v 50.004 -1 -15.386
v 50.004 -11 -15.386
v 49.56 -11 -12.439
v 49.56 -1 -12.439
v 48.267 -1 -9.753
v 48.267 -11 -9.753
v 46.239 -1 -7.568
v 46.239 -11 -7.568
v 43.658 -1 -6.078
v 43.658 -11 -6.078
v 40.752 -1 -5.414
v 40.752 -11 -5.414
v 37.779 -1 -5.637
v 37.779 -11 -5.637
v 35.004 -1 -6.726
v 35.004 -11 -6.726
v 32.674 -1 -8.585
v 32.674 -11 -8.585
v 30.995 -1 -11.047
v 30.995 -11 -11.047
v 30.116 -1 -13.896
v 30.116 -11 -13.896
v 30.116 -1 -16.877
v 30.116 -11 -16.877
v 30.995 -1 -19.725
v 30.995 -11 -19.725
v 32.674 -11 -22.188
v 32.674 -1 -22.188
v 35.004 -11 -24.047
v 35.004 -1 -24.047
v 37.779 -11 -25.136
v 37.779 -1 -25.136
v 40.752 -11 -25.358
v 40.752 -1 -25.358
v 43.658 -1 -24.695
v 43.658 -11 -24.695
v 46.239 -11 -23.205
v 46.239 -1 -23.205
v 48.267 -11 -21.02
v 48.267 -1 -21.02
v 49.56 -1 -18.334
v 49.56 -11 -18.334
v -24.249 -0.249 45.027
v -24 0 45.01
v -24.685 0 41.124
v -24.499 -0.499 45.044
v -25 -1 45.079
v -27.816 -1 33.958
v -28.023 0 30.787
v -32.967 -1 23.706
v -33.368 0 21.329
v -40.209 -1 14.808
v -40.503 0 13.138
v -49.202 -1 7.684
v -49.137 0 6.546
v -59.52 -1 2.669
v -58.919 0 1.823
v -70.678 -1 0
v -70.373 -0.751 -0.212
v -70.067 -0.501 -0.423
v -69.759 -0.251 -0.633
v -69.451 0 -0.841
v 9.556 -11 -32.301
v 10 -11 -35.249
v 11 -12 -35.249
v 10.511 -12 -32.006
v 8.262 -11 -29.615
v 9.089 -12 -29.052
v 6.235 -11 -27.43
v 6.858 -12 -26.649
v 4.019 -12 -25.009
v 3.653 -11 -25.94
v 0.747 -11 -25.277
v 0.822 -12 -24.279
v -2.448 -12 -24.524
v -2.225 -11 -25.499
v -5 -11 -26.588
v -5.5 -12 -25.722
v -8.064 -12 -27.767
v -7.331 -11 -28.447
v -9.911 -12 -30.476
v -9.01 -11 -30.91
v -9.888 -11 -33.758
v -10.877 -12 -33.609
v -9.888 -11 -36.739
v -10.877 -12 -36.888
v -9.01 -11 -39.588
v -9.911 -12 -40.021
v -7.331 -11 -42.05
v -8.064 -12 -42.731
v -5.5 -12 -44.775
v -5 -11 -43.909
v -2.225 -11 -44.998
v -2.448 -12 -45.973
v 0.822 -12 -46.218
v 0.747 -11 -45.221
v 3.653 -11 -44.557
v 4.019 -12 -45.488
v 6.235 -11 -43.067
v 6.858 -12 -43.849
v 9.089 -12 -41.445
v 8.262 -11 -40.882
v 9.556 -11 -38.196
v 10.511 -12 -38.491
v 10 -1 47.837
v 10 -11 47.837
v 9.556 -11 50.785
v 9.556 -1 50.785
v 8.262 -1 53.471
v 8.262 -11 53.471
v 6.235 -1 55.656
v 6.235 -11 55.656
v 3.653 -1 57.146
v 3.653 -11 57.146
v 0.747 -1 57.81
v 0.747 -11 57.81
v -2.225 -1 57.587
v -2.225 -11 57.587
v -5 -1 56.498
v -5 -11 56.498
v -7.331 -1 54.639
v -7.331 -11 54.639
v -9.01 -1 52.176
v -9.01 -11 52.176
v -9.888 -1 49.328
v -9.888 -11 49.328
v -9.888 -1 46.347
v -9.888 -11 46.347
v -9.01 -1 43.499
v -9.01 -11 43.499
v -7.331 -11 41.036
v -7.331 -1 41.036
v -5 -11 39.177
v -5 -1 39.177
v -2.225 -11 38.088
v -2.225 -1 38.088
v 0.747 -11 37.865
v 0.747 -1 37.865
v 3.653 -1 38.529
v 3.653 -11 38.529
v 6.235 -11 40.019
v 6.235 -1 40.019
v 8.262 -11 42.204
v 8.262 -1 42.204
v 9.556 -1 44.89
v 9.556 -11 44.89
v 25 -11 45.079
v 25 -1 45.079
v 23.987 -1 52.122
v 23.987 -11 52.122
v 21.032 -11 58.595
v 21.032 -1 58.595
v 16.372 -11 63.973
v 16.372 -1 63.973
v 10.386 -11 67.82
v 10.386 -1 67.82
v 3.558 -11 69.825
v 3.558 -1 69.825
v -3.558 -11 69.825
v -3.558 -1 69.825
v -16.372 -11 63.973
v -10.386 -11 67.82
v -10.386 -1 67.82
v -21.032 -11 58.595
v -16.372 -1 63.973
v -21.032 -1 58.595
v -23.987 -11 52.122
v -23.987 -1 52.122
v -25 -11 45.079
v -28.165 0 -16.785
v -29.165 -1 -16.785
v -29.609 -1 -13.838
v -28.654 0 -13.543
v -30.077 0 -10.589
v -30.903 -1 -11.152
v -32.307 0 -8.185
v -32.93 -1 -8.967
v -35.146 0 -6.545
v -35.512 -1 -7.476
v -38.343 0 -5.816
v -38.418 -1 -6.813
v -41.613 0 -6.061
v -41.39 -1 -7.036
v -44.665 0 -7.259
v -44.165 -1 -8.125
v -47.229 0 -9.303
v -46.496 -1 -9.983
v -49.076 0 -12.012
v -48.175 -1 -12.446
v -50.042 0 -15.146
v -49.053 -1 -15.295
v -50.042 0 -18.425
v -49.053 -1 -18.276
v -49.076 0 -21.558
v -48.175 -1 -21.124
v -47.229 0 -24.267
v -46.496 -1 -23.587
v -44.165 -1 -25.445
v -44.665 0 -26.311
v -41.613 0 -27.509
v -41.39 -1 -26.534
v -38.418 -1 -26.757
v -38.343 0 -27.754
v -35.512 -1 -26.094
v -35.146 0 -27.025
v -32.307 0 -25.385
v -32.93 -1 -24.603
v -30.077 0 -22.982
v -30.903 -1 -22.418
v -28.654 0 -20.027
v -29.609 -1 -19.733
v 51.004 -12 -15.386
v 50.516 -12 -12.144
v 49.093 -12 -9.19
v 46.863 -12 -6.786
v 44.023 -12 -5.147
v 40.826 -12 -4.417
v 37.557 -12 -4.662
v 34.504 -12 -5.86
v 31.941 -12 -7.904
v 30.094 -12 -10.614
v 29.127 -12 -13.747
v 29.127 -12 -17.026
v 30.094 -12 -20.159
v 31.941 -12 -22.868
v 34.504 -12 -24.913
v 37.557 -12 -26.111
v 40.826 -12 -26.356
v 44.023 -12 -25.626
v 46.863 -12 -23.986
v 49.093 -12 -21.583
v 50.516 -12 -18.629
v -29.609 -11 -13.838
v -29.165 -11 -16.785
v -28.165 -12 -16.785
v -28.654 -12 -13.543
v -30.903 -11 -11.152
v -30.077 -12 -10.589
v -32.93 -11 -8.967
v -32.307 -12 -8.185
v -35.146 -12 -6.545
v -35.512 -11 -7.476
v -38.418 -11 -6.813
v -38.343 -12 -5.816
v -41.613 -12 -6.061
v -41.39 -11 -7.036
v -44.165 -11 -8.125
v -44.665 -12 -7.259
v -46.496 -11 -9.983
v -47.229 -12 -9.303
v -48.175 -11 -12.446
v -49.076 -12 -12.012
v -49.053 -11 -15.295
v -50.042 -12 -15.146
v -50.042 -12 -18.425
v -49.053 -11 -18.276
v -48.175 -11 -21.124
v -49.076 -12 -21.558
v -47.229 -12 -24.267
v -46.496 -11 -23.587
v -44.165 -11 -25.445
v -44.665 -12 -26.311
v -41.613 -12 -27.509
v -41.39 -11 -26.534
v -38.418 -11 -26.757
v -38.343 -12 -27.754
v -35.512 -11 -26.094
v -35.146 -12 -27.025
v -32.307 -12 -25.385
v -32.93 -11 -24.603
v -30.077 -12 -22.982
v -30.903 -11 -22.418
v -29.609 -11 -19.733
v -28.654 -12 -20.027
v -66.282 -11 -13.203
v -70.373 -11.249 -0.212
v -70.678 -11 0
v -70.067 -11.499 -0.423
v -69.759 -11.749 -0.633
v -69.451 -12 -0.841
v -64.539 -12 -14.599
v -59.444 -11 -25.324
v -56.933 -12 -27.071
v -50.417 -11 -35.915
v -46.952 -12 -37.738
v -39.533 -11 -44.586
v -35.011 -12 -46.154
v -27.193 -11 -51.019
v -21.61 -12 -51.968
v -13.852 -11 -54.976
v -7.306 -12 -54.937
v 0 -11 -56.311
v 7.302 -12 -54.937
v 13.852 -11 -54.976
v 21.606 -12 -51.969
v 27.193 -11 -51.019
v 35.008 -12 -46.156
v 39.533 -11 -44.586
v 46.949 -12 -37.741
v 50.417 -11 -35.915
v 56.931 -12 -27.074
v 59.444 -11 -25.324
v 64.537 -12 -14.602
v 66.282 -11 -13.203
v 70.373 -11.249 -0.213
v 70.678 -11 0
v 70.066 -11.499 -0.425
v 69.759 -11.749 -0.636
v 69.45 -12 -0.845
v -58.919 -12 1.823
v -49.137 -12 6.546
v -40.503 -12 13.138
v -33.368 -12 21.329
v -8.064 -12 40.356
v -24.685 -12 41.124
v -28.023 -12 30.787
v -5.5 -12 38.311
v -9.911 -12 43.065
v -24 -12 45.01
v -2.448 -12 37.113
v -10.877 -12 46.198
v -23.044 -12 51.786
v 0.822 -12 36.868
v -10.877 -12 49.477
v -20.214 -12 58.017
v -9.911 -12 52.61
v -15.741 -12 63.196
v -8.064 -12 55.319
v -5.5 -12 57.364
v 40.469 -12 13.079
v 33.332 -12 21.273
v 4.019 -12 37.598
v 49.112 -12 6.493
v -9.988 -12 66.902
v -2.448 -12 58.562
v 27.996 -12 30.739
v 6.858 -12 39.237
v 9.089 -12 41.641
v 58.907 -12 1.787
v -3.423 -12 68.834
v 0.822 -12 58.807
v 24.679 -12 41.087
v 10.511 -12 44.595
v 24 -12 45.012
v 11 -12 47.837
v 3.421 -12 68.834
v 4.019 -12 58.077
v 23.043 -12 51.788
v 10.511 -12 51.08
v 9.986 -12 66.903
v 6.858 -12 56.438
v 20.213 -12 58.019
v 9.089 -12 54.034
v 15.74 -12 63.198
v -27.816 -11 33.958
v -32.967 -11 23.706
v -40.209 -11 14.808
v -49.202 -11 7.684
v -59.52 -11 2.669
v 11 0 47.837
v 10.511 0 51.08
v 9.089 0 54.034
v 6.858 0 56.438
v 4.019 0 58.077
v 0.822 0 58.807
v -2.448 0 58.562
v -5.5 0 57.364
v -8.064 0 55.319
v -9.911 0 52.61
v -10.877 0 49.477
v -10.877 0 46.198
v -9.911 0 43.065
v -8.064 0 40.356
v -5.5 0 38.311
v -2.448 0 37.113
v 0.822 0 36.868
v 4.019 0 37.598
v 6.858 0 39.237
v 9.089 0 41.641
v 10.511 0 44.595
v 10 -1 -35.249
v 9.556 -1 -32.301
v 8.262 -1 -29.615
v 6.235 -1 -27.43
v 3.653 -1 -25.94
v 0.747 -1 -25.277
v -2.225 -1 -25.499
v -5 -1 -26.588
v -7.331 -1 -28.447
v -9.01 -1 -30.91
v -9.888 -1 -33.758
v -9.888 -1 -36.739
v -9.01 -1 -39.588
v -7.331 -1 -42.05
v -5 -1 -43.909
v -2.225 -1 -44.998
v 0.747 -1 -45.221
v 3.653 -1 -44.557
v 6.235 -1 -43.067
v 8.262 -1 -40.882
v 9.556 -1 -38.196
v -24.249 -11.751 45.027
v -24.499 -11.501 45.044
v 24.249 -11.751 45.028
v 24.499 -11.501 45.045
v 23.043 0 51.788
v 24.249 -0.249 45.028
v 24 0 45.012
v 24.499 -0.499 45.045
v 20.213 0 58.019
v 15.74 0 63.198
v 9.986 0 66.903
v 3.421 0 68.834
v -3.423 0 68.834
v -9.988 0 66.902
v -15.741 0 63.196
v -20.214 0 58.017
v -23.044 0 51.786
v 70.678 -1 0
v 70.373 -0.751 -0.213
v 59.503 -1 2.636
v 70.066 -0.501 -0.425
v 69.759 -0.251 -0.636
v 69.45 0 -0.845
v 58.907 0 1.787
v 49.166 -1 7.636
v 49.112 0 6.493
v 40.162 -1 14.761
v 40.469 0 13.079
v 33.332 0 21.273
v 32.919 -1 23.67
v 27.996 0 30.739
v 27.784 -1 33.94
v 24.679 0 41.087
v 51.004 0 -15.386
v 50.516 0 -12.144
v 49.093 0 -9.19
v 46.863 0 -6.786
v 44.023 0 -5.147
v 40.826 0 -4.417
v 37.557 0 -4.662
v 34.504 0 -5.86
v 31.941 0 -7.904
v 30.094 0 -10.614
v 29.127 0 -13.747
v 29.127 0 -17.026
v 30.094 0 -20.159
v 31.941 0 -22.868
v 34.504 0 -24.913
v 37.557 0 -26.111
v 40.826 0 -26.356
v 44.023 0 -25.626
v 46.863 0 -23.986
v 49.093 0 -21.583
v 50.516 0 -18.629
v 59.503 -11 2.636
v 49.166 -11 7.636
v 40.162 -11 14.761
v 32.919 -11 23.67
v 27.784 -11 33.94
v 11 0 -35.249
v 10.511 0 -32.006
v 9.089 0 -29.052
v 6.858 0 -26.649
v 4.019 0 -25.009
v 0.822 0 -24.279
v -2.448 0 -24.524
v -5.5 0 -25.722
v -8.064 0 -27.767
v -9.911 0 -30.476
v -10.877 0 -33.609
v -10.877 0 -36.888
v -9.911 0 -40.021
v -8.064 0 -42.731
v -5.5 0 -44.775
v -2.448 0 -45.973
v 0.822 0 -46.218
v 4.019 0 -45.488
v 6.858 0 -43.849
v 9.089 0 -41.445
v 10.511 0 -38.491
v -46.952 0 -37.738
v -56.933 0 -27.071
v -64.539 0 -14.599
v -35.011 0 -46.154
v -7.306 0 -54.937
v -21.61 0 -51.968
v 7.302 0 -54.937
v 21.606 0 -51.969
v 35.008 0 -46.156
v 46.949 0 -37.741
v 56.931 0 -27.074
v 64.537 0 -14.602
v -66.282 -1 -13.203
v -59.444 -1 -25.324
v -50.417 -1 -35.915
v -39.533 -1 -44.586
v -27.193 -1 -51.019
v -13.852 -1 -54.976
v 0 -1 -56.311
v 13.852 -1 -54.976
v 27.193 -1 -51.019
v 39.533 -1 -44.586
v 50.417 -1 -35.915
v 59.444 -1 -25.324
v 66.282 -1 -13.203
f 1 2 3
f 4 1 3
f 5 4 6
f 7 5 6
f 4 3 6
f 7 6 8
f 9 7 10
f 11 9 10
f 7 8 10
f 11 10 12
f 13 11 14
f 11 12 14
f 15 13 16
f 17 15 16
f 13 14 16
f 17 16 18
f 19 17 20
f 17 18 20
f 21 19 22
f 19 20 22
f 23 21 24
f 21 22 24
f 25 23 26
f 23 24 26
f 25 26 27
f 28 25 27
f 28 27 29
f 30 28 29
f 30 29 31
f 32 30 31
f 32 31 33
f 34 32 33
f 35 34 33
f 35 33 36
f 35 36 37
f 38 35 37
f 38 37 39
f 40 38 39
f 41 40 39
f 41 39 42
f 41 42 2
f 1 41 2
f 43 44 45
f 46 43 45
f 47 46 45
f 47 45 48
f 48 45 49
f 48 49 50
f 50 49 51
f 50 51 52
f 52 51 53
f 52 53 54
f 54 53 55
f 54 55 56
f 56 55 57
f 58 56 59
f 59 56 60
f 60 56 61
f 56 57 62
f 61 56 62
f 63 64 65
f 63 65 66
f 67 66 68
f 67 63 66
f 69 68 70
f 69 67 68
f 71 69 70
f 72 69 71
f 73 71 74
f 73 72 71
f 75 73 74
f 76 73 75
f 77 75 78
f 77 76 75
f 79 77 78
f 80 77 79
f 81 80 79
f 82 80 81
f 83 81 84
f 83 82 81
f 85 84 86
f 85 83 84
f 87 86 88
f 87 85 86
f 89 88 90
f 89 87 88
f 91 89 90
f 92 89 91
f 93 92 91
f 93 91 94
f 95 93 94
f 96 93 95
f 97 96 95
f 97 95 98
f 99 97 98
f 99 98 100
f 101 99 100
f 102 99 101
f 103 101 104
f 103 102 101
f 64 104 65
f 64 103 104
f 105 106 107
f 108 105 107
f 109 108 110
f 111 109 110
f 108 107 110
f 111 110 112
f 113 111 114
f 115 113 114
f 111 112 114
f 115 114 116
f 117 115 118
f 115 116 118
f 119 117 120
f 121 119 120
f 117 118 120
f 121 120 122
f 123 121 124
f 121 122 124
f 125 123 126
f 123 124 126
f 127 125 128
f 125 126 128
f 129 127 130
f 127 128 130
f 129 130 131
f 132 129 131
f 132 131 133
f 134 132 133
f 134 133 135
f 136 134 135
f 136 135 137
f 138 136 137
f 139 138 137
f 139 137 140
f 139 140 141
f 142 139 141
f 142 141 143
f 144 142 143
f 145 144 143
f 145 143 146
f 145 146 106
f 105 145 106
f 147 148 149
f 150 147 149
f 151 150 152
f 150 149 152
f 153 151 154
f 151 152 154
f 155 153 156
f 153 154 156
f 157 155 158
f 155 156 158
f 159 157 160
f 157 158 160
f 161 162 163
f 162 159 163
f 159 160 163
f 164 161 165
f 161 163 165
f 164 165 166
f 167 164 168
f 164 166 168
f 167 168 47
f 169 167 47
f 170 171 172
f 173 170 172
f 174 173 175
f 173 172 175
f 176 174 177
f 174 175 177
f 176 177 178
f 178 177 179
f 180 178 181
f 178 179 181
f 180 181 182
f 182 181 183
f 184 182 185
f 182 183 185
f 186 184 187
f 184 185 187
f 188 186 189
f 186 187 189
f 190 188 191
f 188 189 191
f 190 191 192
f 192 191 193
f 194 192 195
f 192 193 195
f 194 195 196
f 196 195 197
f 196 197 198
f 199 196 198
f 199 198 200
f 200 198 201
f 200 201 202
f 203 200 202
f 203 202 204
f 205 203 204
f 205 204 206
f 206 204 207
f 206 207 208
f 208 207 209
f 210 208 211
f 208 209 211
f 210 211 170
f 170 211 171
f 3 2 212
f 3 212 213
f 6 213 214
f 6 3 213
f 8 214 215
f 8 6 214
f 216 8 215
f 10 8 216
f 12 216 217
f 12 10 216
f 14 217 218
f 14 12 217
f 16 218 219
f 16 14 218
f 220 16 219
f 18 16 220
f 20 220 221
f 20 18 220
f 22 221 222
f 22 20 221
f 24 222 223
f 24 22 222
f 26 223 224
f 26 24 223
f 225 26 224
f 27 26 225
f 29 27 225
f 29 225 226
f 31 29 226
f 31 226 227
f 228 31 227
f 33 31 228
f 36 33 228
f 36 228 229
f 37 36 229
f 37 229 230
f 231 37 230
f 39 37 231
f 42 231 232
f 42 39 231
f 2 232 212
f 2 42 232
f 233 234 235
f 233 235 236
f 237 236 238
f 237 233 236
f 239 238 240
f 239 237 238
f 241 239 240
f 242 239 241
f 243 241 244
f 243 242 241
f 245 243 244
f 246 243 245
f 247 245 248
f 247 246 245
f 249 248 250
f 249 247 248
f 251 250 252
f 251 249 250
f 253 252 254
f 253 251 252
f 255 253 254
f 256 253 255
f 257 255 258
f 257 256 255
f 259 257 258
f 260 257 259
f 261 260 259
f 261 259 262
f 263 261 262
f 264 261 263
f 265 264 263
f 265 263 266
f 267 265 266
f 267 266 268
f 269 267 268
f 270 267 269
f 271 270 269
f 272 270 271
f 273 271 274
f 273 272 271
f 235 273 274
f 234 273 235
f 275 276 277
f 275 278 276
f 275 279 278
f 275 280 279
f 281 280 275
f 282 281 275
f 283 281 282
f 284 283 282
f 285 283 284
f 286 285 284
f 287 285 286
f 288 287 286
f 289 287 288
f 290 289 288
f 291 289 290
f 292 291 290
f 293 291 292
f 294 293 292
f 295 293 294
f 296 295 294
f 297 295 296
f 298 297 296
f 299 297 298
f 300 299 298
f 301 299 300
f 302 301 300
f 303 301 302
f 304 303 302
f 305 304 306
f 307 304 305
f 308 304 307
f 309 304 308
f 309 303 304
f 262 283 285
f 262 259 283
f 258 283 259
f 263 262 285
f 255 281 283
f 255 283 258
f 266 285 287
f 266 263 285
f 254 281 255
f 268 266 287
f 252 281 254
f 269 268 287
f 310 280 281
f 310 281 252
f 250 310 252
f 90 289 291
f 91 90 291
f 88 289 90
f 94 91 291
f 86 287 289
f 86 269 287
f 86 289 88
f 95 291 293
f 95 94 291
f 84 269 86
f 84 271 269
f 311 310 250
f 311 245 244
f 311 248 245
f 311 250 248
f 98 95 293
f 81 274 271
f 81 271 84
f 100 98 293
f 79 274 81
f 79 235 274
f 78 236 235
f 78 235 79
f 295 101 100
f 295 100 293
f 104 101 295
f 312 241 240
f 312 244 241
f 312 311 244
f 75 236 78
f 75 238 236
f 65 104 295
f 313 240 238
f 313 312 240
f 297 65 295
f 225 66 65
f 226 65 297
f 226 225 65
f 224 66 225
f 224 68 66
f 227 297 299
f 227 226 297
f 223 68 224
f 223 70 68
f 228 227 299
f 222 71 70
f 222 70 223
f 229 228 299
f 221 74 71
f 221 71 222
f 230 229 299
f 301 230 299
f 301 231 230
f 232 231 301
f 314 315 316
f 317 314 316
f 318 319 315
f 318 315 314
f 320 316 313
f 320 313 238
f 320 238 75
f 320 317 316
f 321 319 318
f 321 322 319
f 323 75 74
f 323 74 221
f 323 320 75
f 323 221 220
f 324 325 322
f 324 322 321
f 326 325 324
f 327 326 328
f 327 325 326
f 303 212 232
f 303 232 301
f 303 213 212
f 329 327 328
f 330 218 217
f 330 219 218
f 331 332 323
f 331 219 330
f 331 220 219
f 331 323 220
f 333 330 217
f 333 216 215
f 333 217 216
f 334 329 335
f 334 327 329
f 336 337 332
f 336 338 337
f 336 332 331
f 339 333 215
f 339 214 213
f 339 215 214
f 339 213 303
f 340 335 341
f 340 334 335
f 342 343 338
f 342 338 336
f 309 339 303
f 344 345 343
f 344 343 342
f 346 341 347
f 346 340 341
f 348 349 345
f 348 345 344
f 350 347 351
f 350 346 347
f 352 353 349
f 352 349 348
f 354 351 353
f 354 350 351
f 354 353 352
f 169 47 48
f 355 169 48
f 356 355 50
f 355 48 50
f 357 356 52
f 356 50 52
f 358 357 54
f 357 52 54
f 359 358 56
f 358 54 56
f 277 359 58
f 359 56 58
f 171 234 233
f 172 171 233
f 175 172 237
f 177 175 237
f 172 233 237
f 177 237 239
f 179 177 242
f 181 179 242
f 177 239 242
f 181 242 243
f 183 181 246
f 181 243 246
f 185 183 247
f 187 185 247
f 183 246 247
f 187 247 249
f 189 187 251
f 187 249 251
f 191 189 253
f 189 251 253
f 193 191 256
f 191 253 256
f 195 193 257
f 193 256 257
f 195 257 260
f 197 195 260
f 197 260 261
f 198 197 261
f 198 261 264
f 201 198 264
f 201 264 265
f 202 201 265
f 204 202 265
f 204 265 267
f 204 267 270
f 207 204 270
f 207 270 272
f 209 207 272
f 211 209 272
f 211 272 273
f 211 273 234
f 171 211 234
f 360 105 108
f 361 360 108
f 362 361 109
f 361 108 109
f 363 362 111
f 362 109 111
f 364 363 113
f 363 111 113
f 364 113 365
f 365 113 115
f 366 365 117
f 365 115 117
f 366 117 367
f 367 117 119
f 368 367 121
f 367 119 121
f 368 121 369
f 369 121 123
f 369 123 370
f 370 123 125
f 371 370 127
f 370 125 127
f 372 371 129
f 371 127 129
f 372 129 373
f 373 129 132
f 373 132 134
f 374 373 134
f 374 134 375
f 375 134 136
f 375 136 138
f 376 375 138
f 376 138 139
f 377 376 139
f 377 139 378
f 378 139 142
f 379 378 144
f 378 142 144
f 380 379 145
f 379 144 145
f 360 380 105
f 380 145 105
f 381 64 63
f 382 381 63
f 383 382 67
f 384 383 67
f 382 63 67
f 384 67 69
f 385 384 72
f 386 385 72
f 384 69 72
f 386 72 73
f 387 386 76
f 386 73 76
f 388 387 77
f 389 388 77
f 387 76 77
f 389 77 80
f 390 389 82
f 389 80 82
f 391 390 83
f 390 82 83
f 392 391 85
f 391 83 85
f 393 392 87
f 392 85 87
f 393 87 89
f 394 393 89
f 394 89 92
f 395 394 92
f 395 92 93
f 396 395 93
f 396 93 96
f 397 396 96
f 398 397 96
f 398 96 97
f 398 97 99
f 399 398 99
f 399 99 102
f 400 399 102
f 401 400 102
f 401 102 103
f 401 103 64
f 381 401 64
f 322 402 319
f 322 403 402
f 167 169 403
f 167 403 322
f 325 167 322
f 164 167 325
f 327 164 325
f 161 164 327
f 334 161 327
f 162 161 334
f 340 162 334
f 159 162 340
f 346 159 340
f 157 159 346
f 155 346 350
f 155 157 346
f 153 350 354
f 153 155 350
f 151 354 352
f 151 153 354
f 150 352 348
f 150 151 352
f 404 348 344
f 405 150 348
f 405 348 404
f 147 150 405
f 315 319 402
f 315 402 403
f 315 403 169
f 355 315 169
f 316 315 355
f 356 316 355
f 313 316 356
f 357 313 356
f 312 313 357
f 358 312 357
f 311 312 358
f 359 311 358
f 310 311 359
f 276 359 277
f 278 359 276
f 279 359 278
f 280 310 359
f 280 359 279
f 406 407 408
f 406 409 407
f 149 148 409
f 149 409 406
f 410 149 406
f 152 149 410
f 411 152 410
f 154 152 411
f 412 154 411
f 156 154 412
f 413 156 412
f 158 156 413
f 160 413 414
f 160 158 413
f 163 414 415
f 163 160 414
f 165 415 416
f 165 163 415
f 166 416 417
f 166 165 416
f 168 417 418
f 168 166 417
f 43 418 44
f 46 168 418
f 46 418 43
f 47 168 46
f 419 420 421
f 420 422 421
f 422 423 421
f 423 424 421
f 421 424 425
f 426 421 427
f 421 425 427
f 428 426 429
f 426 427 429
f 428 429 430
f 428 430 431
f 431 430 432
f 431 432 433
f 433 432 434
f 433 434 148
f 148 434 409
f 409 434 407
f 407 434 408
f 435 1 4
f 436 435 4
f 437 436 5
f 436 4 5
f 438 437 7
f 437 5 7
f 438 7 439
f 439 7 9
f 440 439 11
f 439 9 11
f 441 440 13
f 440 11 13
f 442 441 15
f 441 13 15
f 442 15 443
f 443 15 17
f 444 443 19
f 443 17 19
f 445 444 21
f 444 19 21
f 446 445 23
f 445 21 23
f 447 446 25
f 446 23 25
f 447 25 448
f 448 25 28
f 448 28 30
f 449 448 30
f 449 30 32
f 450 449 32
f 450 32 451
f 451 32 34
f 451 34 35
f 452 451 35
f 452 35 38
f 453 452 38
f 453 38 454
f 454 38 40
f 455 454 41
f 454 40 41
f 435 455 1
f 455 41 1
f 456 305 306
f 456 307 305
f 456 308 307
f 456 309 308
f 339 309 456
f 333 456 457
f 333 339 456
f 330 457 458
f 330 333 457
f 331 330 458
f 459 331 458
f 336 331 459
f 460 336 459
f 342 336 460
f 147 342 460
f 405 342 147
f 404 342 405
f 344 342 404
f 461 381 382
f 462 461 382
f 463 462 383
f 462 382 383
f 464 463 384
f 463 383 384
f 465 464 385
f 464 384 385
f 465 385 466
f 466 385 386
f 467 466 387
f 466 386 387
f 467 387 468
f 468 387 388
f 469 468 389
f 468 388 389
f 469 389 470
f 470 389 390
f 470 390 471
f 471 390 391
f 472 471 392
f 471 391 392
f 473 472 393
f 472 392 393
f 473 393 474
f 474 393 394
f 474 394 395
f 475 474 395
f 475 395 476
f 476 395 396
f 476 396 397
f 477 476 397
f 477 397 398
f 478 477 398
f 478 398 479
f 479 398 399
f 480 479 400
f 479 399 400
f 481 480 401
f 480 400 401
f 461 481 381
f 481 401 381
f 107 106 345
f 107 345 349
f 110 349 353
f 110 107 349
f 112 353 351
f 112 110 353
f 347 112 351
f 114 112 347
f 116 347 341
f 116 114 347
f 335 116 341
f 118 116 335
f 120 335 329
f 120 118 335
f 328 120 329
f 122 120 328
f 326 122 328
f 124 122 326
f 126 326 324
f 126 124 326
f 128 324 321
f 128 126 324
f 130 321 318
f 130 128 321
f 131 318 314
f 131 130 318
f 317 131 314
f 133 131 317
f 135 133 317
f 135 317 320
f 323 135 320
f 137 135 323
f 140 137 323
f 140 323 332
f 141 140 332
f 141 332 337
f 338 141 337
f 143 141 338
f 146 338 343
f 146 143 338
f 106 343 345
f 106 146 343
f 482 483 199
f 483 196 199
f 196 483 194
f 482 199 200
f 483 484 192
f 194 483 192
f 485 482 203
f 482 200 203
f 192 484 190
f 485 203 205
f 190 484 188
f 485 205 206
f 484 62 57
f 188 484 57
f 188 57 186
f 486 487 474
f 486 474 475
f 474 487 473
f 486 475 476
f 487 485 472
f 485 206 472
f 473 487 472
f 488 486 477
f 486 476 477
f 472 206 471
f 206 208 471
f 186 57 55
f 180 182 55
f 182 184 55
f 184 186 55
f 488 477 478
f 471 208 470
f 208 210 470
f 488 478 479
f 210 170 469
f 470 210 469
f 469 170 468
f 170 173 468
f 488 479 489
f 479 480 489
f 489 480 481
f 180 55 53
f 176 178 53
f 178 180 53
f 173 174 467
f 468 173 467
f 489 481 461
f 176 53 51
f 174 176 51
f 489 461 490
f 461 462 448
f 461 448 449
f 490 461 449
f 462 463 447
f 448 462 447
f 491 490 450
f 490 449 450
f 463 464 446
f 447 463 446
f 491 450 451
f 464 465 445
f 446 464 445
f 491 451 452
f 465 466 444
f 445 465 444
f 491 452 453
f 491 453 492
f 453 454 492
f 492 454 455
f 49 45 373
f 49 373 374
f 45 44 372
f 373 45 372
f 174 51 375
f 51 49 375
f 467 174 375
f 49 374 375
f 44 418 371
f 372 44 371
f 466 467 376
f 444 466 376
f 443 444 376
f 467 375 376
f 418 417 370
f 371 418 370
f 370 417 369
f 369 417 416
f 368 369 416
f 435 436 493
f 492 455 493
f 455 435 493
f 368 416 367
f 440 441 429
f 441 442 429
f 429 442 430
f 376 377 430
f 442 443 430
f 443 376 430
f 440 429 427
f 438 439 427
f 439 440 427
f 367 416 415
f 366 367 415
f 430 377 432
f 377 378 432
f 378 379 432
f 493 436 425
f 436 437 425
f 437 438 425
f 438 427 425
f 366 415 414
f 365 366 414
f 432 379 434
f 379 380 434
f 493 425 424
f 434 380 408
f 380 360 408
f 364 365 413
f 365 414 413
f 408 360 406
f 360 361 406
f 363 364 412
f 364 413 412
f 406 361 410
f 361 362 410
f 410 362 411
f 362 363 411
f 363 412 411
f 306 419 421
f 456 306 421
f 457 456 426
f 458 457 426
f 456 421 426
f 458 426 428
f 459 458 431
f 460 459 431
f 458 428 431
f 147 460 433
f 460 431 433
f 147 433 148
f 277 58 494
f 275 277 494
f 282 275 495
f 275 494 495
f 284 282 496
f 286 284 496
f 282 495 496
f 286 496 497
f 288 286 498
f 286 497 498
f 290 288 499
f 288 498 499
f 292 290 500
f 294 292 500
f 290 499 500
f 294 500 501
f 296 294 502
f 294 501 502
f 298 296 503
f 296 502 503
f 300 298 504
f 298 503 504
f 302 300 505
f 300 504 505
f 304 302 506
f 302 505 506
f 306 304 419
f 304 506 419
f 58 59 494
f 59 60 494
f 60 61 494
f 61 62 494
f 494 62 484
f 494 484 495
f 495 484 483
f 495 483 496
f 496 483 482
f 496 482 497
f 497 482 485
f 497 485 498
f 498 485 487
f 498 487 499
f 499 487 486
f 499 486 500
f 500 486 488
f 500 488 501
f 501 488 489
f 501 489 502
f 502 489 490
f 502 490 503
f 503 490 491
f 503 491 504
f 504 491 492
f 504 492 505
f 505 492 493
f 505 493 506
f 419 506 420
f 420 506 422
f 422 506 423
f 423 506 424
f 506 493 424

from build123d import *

# Parameters (mm, degrees)
F1_DEPTH   = 12
F3_D       = 20
F4_C1_SIZE = 1
F4_C2_SIZE = 1
F4_C3_SIZE = 1
F4_C4_SIZE = 1
F4_C5_SIZE = 1
F4_C6_SIZE = 1
F4_C7_SIZE = 1
F4_C8_SIZE = 0.9999
F5_C1_SIZE = 1
F5_C2_SIZE = 1
F5_C3_SIZE = 1
F5_C4_SIZE = 1
F5_C5_SIZE = 1
F5_C6_SIZE = 1
F5_C7_SIZE = 1
F5_C8_SIZE = 0.9999


# Not quite as in the source:
# - a fillet or chamfer is up to 0.001 mm smaller than in the source, because OpenCascade refuses the exact size


with BuildPart() as f1:
    # F0 (on Front) → F1 (new body)
    with BuildSketch(Plane.XZ):
        with BuildLine():
            ThreePointArc((-70.6781876117, 0), (0, -56.3108485805), (70.6781876117, 0))
            ThreePointArc((70.6781876117, 0), (40.1621081353, 14.7607018174), (25, 45.079341326))
            ThreePointArc((25, 45.079341326), (0, 20.079341326), (-25, 45.079341326))
            ThreePointArc((-25, 45.079341326), (-40.2089612492, 14.808177341), (-70.6781876117, 0))
        make_face()
        with BuildLine():
            ThreePointArc((-25, 45.079341326), (0, 20.079341326), (25, 45.079341326))
            Line((25, 45.079341326), (-25, 45.079341326))
        make_face()
        with BuildLine():
            Line((-25, 45.079341326), (25, 45.079341326))
            ThreePointArc((25, 45.079341326), (0, 70.079341326), (-25, 45.079341326))
        make_face()
    extrude(amount=F1_DEPTH)

    # F3 (through all)
    with Locations(Plane(origin=(0, 0, 0), x_dir=(-1, 0, 0), z_dir=(0, 1, 0))):
        with Locations((-40.0044433773, -15.3863234445), (0, -35.2486670017), (39.1651876271, -16.7850796133), (0, 47.8374771774)):
            Hole(F3_D / 2)

    # F4: chamfer of 1 on 8 edges, made by hand

    # F4_c1
    f4_c1_edges = [f1.edges().sort_by_distance(p)[0] for p in [
        (40.1621081353, 0, 14.7607018174),
    ]]
    chamfer(f4_c1_edges, length=F4_C1_SIZE)

    # F4_c2
    f4_c2_edges = [f1.edges().sort_by_distance(p)[0] for p in [
        (-0.5029833863, 0, -56.3091040511),
    ]]
    chamfer(f4_c2_edges, length=F4_C2_SIZE)

    # F4_c3
    f4_c3_edges = [f1.edges().sort_by_distance(p)[0] for p in [
        (-39.8532973479, 0, 15.1625303947),
    ]]
    chamfer(f4_c3_edges, length=F4_C3_SIZE)

    # F4_c4
    f4_c4_edges = [f1.edges().sort_by_distance(p)[0] for p in [
        (10, 0, -35.2486670017),
    ]]
    chamfer(f4_c4_edges, length=F4_C4_SIZE)

    # F4_c5
    f4_c5_edges = [f1.edges().sort_by_distance(p)[0] for p in [
        (-29.1651876271, 0, -16.7850796133),
    ]]
    chamfer(f4_c5_edges, length=F4_C5_SIZE)

    # F4_c6
    f4_c6_edges = [f1.edges().sort_by_distance(p)[0] for p in [
        (50.0044433773, 0, -15.3863234445),
    ]]
    chamfer(f4_c6_edges, length=F4_C6_SIZE)

    # F4_c7
    f4_c7_edges = [f1.edges().sort_by_distance(p)[0] for p in [
        (10, 0, 47.8374771774),
    ]]
    chamfer(f4_c7_edges, length=F4_C7_SIZE)

    # F4_c8 (size 1 in the source; OpenCascade refuses exactly that, so slightly less here)
    f4_c8_edges = [f1.edges().sort_by_distance(p)[0] for p in [
        (0, 0, 70.079341326),
    ]]
    chamfer(f4_c8_edges, length=F4_C8_SIZE)

    # F5: chamfer of 1 on 8 edges, made by hand

    # F5_c1
    f5_c1_edges = [f1.edges().sort_by_distance(p)[0] for p in [
        (40.1621081353, -12, 14.7607018174),
    ]]
    chamfer(f5_c1_edges, length=F5_C1_SIZE)

    # F5_c2
    f5_c2_edges = [f1.edges().sort_by_distance(p)[0] for p in [
        (-0.5029833863, -12, -56.3091040511),
    ]]
    chamfer(f5_c2_edges, length=F5_C2_SIZE)

    # F5_c3
    f5_c3_edges = [f1.edges().sort_by_distance(p)[0] for p in [
        (-39.8532973479, -12, 15.1625303947),
    ]]
    chamfer(f5_c3_edges, length=F5_C3_SIZE)

    # F5_c4
    f5_c4_edges = [f1.edges().sort_by_distance(p)[0] for p in [
        (10, -12, 47.8374771774),
    ]]
    chamfer(f5_c4_edges, length=F5_C4_SIZE)

    # F5_c5
    f5_c5_edges = [f1.edges().sort_by_distance(p)[0] for p in [
        (50.0044433773, -12, -15.3863234445),
    ]]
    chamfer(f5_c5_edges, length=F5_C5_SIZE)

    # F5_c6
    f5_c6_edges = [f1.edges().sort_by_distance(p)[0] for p in [
        (-29.1651876271, -12, -16.7850796133),
    ]]
    chamfer(f5_c6_edges, length=F5_C6_SIZE)

    # F5_c7
    f5_c7_edges = [f1.edges().sort_by_distance(p)[0] for p in [
        (10, -12, -35.2486670017),
    ]]
    chamfer(f5_c7_edges, length=F5_C7_SIZE)

    # F5_c8 (size 1 in the source; OpenCascade refuses exactly that, so slightly less here)
    f5_c8_edges = [f1.edges().sort_by_distance(p)[0] for p in [
        (0, -12, 70.079341326),
    ]]
    chamfer(f5_c8_edges, length=F5_C8_SIZE)


solid = f1.part
